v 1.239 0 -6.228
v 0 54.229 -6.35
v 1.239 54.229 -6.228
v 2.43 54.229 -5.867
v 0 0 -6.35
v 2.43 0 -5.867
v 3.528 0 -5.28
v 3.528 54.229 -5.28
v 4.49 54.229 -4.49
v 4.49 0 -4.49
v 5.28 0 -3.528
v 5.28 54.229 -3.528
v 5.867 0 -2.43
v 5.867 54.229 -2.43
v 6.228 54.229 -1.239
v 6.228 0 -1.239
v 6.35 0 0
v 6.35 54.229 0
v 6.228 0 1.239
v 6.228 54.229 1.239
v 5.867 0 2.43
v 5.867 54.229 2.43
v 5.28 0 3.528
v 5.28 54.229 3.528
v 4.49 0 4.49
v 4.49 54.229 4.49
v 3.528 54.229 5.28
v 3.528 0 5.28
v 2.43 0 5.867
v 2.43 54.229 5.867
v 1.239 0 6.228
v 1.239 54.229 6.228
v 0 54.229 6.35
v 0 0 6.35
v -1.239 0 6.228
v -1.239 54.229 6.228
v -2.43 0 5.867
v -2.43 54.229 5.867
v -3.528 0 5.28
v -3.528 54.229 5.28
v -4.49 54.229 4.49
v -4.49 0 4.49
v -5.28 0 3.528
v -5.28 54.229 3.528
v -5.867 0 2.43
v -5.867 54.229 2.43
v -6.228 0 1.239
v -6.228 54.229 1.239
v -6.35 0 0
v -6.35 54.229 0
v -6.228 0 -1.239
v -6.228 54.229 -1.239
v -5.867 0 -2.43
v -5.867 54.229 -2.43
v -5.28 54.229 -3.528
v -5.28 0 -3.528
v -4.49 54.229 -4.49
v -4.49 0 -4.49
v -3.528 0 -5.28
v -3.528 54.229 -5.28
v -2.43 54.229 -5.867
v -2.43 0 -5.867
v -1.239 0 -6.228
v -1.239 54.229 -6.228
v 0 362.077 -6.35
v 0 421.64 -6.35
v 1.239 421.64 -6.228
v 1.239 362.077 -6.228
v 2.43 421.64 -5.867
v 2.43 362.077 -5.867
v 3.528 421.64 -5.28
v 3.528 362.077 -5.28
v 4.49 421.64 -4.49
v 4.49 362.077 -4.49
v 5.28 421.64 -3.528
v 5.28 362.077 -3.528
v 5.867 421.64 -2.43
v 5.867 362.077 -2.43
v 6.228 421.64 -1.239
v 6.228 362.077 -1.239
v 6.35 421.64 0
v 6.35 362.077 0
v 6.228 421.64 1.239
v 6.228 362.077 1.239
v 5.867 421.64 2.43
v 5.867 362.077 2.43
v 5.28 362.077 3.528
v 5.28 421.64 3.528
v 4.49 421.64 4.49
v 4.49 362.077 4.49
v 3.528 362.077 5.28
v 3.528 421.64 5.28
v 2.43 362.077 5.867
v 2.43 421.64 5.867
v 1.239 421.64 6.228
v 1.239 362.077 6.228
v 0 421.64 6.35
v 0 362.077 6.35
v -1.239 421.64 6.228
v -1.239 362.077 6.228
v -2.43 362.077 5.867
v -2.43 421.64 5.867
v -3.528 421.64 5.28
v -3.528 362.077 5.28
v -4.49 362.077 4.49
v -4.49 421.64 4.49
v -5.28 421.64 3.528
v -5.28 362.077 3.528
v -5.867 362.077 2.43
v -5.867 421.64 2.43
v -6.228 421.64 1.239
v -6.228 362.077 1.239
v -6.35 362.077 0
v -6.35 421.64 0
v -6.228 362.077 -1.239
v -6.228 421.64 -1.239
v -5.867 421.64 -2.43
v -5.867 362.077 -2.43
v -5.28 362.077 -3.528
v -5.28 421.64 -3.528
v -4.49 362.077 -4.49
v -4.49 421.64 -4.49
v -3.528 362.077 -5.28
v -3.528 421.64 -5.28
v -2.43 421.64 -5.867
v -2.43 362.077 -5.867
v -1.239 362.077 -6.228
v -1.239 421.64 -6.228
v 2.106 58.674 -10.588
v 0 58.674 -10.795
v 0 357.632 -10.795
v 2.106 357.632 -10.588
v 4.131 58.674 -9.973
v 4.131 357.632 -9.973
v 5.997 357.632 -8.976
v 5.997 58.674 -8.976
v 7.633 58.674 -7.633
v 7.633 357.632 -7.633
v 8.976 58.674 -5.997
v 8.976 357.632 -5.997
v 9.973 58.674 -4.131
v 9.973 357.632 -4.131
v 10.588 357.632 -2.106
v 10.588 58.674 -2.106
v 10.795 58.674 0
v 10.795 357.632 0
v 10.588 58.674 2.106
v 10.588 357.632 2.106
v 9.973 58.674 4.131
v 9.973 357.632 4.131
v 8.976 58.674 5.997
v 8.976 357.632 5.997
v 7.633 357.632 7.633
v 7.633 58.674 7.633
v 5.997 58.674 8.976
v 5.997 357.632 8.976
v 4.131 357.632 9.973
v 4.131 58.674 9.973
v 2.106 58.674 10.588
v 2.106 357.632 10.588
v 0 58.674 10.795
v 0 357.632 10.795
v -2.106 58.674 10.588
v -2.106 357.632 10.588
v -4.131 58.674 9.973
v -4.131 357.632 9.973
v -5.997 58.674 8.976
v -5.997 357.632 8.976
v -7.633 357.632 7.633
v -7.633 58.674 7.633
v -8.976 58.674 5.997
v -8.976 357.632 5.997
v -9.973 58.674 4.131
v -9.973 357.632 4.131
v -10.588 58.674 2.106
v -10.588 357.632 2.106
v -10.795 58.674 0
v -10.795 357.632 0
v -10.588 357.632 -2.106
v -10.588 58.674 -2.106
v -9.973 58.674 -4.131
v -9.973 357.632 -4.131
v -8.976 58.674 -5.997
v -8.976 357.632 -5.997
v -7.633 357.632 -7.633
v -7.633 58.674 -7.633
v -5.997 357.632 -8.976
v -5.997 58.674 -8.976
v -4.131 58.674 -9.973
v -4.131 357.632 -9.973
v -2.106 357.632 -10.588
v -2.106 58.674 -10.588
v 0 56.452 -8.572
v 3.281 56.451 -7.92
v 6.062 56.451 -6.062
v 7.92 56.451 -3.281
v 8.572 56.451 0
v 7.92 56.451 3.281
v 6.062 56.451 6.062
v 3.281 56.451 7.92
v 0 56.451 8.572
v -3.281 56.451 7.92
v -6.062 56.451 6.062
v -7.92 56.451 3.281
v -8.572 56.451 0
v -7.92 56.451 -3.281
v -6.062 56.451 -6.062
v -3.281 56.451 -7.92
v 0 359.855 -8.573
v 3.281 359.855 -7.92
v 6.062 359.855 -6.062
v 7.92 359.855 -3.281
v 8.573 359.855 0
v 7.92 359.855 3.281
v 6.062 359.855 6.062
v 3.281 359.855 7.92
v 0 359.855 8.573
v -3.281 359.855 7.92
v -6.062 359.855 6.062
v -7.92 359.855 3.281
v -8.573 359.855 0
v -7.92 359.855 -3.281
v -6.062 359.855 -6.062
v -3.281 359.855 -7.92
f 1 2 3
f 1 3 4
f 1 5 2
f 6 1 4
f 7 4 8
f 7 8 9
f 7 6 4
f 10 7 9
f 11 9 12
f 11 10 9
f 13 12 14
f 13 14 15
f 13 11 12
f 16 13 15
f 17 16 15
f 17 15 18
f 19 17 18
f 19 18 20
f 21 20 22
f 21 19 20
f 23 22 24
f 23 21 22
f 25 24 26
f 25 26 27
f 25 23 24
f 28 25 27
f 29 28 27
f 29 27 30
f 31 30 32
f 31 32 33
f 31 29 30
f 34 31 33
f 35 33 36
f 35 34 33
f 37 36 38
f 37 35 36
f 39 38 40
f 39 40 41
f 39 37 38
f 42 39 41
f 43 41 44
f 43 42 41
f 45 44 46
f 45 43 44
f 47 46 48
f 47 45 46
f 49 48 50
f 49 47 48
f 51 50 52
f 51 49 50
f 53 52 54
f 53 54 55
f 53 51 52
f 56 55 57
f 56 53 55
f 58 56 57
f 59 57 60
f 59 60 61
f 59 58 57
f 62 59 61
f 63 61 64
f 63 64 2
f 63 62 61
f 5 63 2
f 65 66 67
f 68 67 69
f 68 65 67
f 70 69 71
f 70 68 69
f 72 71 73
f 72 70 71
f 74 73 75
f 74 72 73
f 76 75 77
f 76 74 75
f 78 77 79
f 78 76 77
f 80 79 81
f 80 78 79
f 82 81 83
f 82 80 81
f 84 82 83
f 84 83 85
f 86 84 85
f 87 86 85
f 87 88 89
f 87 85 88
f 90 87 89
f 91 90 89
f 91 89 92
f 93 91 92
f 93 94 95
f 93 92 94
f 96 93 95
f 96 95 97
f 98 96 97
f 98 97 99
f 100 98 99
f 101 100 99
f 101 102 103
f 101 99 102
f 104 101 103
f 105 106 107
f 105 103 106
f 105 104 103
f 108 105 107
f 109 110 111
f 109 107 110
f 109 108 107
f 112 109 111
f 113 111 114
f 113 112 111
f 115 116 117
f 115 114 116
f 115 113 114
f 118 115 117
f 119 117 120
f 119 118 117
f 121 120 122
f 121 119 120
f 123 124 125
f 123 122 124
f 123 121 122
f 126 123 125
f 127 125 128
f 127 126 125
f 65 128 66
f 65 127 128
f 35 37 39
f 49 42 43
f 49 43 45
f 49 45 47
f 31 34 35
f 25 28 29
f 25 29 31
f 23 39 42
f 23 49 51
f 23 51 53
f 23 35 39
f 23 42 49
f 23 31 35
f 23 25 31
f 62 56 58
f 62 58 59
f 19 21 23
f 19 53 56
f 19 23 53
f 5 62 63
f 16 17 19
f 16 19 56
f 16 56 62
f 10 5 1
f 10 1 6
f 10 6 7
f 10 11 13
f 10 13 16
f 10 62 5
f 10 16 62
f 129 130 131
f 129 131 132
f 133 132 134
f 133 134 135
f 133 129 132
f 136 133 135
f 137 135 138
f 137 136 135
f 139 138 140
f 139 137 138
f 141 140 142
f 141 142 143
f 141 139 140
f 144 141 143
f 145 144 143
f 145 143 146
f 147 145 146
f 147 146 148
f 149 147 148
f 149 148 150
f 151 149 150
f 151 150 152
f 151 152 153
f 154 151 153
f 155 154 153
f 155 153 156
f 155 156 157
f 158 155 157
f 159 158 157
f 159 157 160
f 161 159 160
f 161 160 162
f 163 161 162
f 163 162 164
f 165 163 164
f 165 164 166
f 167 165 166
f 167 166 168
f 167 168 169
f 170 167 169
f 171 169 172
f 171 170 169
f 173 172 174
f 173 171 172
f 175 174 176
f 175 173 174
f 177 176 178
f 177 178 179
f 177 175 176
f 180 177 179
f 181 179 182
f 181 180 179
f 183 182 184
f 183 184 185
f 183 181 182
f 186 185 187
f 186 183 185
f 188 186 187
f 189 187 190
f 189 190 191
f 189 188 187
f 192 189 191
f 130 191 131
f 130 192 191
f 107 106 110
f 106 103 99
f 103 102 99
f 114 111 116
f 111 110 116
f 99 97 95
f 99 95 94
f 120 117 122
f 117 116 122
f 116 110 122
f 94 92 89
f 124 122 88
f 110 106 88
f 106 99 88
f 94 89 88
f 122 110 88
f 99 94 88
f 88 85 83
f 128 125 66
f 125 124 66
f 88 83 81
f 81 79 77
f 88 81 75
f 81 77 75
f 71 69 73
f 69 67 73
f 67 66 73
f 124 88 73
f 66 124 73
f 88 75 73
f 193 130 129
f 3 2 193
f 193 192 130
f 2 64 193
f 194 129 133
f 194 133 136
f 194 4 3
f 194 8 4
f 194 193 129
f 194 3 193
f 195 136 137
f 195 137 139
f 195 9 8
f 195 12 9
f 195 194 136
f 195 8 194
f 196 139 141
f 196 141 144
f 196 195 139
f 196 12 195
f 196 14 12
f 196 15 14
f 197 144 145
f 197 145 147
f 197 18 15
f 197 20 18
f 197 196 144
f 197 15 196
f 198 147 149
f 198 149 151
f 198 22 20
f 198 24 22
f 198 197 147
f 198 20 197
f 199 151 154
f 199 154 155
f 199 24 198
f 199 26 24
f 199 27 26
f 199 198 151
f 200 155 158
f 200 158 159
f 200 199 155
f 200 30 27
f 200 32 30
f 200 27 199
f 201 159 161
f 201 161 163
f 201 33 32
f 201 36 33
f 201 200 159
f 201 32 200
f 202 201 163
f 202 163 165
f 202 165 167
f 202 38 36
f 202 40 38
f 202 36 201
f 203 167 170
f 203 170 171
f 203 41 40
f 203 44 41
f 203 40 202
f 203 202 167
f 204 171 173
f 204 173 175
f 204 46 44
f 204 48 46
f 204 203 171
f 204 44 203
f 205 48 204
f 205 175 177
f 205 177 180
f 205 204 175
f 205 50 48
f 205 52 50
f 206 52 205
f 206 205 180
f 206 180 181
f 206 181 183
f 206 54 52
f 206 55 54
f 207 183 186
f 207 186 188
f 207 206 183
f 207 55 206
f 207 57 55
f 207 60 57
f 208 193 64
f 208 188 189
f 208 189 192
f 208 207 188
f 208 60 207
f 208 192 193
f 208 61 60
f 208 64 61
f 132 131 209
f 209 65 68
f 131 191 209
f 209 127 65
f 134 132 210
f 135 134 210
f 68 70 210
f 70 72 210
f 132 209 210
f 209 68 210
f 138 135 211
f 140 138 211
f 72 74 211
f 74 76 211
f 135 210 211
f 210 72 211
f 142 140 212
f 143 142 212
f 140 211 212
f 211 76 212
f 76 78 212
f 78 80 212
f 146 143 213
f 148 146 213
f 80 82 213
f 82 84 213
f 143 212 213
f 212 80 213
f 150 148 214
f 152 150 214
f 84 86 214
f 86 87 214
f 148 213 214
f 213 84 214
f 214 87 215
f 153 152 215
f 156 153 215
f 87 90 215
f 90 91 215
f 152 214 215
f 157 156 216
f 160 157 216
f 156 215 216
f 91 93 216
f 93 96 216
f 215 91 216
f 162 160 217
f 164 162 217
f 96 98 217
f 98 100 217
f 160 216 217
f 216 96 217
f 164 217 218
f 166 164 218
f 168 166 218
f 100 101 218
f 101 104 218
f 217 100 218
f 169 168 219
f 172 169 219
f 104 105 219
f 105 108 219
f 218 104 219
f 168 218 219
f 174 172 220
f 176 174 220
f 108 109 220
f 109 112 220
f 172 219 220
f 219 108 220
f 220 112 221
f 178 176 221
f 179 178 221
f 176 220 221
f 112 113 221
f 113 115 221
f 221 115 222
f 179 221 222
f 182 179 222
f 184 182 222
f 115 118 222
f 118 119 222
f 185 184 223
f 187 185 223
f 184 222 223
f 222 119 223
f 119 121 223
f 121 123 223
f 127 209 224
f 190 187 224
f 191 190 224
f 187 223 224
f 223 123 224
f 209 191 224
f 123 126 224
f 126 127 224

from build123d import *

# Parameters (mm, degrees)
SKETCH1_R           = 6.35
BOSS_EXTRUDE1_DEPTH = 421.64
SKETCH2_R           = 10.795
BOSS_EXTRUDE2_DEPTH = 421.64
SKETCH3_R           = 25.4
SKETCH3_R_2         = 6.35
CUT_EXTRUDE1_DEPTH  = 52.324
CUT_EXTRUDE2_START  = -57.658
SKETCH4_R           = 25.4
SKETCH4_R_2         = 6.35
CUT_EXTRUDE2_DEPTH  = 57.658
CHAMFER1_SIZE       = 6.35


with BuildPart() as part:
    # Sketch1 → Boss-Extrude1 (new body)
    with BuildSketch(Plane(origin=(0, 0, 0), x_dir=(1, 0, 0), z_dir=(0, 1, 0))):
        with Locations(Location((0, 0, 0), (0, 0, 270))):
            Circle(SKETCH1_R)
    extrude(amount=BOSS_EXTRUDE1_DEPTH)

    # Sketch2 → Boss-Extrude2 (add)
    with BuildSketch(Plane(origin=(0, 0, 0), x_dir=(-1, 0, 0), z_dir=(0, -1, 0))):
        with Locations(Location((0, 0, 0), (0, 0, 90))):
            Circle(SKETCH2_R)
    extrude(amount=-BOSS_EXTRUDE2_DEPTH)

    # Sketch3 → Cut-Extrude1 (cut)
    with BuildSketch(Plane.XZ):
        Circle(SKETCH3_R)
        with Locations(Location((0, 0, 0), (0, 0, 270))):
            Circle(SKETCH3_R_2, mode=Mode.SUBTRACT)
    extrude(amount=-CUT_EXTRUDE1_DEPTH, mode=Mode.SUBTRACT)

    # Sketch4 → Cut-Extrude2 (cut)
    with BuildSketch(Plane(origin=(0, 421.64, 0), x_dir=(1, 0, 0), z_dir=(0, 1, 0)).offset(CUT_EXTRUDE2_START)):
        Circle(SKETCH4_R)
        with Locations(Location((0, 0, 0), (0, 0, 90))):
            Circle(SKETCH4_R_2, mode=Mode.SUBTRACT)
    extrude(amount=CUT_EXTRUDE2_DEPTH, mode=Mode.SUBTRACT)

    # Chamfer1
    # the kernel refuses this chamfer: 6.35 mm, written as the material it takes off along each edge
    with BuildSketch(Plane(origin=(0, 52.324, 0), x_dir=(0, 0, -1), z_dir=(-1, 0, 0))) as chamfer1_piece_1_section:
        Polygon((10.795, -CHAMFER1_SIZE), (10.795 - CHAMFER1_SIZE, 0), (10.795, 0), align=None)
    chamfer1_piece_1 = revolve(axis=Axis((0, 52.324, 0), (0, -1, 0)), mode=Mode.PRIVATE)
    chamfer1_piece_1 = chamfer1_piece_1 - Plane(origin=(0, 56.4676015, 0), x_dir=(0, 0, -1), z_dir=(0, -1, 0)) * Cylinder(6.35, 44, mode=Mode.PRIVATE)
    add(chamfer1_piece_1, mode=Mode.SUBTRACT)
    with BuildSketch(Plane(origin=(0, 363.982, 0), x_dir=(0, 0, -1), z_dir=(-1, 0, 0))) as chamfer1_piece_2_section:
        Polygon((10.795, CHAMFER1_SIZE), (10.795 - CHAMFER1_SIZE, 0), (10.795, 0), align=None)
    chamfer1_piece_2 = revolve(axis=Axis((0, 363.982, 0), (0, -1, 0)), mode=Mode.PRIVATE)
    chamfer1_piece_2 = chamfer1_piece_2 - Plane(origin=(0, 359.8383985, 0), x_dir=(0, 0, -1), z_dir=(0, -1, 0)) * Cylinder(6.35, 44, mode=Mode.PRIVATE)
    add(chamfer1_piece_2, mode=Mode.SUBTRACT)


solid = part.part
